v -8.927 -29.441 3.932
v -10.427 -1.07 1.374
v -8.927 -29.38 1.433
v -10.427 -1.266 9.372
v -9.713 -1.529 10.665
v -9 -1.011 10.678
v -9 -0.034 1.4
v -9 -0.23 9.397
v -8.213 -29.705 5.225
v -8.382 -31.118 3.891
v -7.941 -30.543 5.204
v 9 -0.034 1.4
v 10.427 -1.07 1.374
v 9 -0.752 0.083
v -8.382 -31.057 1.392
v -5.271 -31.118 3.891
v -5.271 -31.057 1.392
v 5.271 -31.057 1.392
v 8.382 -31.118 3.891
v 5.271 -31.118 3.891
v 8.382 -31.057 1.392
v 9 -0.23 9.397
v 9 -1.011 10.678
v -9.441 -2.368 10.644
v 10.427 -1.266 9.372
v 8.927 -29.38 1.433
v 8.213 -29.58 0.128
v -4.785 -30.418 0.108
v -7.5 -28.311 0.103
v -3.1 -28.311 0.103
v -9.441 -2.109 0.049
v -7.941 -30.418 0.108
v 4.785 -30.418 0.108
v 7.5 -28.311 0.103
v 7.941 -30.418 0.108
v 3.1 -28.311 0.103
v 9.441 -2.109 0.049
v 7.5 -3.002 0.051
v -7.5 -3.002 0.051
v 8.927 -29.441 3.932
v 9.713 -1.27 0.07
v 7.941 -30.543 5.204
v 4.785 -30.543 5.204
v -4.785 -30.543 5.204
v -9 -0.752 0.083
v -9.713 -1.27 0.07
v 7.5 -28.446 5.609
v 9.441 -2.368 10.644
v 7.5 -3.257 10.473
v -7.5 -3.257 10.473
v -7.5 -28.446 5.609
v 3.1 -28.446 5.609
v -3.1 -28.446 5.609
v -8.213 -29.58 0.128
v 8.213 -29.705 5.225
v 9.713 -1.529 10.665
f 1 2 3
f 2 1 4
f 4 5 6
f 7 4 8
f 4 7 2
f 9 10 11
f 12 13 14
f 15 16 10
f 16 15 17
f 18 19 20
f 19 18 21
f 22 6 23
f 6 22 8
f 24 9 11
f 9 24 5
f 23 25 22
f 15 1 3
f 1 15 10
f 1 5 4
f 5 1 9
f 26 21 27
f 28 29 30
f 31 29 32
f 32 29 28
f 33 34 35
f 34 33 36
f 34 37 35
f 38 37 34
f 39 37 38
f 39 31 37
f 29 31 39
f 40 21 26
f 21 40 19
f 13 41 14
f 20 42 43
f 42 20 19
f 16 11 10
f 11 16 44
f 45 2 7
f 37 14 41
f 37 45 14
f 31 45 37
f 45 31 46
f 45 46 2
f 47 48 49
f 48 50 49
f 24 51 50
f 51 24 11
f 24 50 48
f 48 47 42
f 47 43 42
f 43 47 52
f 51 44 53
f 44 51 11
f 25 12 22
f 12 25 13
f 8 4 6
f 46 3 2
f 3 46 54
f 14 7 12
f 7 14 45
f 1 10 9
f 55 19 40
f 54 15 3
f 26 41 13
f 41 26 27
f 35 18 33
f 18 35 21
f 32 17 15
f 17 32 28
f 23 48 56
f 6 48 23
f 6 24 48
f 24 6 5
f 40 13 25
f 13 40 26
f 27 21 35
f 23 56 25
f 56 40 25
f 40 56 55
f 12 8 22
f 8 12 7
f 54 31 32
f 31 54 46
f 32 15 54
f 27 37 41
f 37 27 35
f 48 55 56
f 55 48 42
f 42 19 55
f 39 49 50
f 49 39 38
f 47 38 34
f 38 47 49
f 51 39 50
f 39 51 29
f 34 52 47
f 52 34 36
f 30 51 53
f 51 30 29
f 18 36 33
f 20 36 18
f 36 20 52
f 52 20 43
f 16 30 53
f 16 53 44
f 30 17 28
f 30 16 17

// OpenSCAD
clip_height = 21;
clip_width = 11;
clip_depth = 31.3;
clip_wall = 3;
clip_lip = 5.5;
clip_lip_slope = 0.80;
radius = clip_height;
inner_radius = radius * sqrt(3)/2;

end_clip(clip_depth, clip_width, clip_height, clip_wall, clip_lip, clip_lip_slope);

module end_clip(x, y, z, wall, lip, slope) {
    inner_x = x - (2*wall);
    inner_z = z - (2*wall);
    outter_x = x-wall;
    outter_z = z-wall;
    
    rotate([90,-1.4,90])
    translate([-x/2, y/2-0.1, 0])
    difference() {
        hull() {
            translate([-outter_x/2, -2,-outter_z/2+(wall/2)]) rotate([90,0,0])
            dowel(wall, y/2);
            translate([outter_x/2,0,-outter_z/2]) rotate([90,0,0])
            dowel(wall, y);
            translate([-outter_x/2,-2,outter_z/2-(wall/2)]) rotate([90,0,0])
            dowel(wall, y/2);
            translate([outter_x/2,0,outter_z/2]) rotate([90,0,0])
            dowel(wall, y);
            }
  
        translate([0, 0, 0])
        cube([inner_x, y, inner_z],center=true);
        translate([-wall-1,0,0]) cube([inner_x+1,y+wall,inner_z - (2*lip)],center=true);
        translate([-(x/2 -wall*1.5), -(y+1)/2, ((inner_z - (2*lip))/2)-0.1]) rotate([0,0,90]) prism(y+wall, y, y*slope);
        translate([-(x/2 - wall*1.5),  (y+1)/2, -((inner_z - (2*lip))/2)+0.1]) rotate([0,180,90]) prism(y+wall, y, y*slope);
    }
}

module dowel(w,h) {
    cylinder(h = h-w, r1 = w/2, r2 = w/2, center = true);
    translate([0,0,(h-w)/2])
    sphere(d = w);
    translate([0,0,-(h-w)/2])
    sphere(d = w);
}

module prism(l, w, h){
    polyhedron(
        points=[[0,0,0], [l,0,0], [l,w,0], [0,w,0], [0,w,h], [l,w,h]],
        faces=[[0,1,2,3],[5,4,3,2],[0,4,5,1],[0,3,4],[5,2,1]]
    );
}
